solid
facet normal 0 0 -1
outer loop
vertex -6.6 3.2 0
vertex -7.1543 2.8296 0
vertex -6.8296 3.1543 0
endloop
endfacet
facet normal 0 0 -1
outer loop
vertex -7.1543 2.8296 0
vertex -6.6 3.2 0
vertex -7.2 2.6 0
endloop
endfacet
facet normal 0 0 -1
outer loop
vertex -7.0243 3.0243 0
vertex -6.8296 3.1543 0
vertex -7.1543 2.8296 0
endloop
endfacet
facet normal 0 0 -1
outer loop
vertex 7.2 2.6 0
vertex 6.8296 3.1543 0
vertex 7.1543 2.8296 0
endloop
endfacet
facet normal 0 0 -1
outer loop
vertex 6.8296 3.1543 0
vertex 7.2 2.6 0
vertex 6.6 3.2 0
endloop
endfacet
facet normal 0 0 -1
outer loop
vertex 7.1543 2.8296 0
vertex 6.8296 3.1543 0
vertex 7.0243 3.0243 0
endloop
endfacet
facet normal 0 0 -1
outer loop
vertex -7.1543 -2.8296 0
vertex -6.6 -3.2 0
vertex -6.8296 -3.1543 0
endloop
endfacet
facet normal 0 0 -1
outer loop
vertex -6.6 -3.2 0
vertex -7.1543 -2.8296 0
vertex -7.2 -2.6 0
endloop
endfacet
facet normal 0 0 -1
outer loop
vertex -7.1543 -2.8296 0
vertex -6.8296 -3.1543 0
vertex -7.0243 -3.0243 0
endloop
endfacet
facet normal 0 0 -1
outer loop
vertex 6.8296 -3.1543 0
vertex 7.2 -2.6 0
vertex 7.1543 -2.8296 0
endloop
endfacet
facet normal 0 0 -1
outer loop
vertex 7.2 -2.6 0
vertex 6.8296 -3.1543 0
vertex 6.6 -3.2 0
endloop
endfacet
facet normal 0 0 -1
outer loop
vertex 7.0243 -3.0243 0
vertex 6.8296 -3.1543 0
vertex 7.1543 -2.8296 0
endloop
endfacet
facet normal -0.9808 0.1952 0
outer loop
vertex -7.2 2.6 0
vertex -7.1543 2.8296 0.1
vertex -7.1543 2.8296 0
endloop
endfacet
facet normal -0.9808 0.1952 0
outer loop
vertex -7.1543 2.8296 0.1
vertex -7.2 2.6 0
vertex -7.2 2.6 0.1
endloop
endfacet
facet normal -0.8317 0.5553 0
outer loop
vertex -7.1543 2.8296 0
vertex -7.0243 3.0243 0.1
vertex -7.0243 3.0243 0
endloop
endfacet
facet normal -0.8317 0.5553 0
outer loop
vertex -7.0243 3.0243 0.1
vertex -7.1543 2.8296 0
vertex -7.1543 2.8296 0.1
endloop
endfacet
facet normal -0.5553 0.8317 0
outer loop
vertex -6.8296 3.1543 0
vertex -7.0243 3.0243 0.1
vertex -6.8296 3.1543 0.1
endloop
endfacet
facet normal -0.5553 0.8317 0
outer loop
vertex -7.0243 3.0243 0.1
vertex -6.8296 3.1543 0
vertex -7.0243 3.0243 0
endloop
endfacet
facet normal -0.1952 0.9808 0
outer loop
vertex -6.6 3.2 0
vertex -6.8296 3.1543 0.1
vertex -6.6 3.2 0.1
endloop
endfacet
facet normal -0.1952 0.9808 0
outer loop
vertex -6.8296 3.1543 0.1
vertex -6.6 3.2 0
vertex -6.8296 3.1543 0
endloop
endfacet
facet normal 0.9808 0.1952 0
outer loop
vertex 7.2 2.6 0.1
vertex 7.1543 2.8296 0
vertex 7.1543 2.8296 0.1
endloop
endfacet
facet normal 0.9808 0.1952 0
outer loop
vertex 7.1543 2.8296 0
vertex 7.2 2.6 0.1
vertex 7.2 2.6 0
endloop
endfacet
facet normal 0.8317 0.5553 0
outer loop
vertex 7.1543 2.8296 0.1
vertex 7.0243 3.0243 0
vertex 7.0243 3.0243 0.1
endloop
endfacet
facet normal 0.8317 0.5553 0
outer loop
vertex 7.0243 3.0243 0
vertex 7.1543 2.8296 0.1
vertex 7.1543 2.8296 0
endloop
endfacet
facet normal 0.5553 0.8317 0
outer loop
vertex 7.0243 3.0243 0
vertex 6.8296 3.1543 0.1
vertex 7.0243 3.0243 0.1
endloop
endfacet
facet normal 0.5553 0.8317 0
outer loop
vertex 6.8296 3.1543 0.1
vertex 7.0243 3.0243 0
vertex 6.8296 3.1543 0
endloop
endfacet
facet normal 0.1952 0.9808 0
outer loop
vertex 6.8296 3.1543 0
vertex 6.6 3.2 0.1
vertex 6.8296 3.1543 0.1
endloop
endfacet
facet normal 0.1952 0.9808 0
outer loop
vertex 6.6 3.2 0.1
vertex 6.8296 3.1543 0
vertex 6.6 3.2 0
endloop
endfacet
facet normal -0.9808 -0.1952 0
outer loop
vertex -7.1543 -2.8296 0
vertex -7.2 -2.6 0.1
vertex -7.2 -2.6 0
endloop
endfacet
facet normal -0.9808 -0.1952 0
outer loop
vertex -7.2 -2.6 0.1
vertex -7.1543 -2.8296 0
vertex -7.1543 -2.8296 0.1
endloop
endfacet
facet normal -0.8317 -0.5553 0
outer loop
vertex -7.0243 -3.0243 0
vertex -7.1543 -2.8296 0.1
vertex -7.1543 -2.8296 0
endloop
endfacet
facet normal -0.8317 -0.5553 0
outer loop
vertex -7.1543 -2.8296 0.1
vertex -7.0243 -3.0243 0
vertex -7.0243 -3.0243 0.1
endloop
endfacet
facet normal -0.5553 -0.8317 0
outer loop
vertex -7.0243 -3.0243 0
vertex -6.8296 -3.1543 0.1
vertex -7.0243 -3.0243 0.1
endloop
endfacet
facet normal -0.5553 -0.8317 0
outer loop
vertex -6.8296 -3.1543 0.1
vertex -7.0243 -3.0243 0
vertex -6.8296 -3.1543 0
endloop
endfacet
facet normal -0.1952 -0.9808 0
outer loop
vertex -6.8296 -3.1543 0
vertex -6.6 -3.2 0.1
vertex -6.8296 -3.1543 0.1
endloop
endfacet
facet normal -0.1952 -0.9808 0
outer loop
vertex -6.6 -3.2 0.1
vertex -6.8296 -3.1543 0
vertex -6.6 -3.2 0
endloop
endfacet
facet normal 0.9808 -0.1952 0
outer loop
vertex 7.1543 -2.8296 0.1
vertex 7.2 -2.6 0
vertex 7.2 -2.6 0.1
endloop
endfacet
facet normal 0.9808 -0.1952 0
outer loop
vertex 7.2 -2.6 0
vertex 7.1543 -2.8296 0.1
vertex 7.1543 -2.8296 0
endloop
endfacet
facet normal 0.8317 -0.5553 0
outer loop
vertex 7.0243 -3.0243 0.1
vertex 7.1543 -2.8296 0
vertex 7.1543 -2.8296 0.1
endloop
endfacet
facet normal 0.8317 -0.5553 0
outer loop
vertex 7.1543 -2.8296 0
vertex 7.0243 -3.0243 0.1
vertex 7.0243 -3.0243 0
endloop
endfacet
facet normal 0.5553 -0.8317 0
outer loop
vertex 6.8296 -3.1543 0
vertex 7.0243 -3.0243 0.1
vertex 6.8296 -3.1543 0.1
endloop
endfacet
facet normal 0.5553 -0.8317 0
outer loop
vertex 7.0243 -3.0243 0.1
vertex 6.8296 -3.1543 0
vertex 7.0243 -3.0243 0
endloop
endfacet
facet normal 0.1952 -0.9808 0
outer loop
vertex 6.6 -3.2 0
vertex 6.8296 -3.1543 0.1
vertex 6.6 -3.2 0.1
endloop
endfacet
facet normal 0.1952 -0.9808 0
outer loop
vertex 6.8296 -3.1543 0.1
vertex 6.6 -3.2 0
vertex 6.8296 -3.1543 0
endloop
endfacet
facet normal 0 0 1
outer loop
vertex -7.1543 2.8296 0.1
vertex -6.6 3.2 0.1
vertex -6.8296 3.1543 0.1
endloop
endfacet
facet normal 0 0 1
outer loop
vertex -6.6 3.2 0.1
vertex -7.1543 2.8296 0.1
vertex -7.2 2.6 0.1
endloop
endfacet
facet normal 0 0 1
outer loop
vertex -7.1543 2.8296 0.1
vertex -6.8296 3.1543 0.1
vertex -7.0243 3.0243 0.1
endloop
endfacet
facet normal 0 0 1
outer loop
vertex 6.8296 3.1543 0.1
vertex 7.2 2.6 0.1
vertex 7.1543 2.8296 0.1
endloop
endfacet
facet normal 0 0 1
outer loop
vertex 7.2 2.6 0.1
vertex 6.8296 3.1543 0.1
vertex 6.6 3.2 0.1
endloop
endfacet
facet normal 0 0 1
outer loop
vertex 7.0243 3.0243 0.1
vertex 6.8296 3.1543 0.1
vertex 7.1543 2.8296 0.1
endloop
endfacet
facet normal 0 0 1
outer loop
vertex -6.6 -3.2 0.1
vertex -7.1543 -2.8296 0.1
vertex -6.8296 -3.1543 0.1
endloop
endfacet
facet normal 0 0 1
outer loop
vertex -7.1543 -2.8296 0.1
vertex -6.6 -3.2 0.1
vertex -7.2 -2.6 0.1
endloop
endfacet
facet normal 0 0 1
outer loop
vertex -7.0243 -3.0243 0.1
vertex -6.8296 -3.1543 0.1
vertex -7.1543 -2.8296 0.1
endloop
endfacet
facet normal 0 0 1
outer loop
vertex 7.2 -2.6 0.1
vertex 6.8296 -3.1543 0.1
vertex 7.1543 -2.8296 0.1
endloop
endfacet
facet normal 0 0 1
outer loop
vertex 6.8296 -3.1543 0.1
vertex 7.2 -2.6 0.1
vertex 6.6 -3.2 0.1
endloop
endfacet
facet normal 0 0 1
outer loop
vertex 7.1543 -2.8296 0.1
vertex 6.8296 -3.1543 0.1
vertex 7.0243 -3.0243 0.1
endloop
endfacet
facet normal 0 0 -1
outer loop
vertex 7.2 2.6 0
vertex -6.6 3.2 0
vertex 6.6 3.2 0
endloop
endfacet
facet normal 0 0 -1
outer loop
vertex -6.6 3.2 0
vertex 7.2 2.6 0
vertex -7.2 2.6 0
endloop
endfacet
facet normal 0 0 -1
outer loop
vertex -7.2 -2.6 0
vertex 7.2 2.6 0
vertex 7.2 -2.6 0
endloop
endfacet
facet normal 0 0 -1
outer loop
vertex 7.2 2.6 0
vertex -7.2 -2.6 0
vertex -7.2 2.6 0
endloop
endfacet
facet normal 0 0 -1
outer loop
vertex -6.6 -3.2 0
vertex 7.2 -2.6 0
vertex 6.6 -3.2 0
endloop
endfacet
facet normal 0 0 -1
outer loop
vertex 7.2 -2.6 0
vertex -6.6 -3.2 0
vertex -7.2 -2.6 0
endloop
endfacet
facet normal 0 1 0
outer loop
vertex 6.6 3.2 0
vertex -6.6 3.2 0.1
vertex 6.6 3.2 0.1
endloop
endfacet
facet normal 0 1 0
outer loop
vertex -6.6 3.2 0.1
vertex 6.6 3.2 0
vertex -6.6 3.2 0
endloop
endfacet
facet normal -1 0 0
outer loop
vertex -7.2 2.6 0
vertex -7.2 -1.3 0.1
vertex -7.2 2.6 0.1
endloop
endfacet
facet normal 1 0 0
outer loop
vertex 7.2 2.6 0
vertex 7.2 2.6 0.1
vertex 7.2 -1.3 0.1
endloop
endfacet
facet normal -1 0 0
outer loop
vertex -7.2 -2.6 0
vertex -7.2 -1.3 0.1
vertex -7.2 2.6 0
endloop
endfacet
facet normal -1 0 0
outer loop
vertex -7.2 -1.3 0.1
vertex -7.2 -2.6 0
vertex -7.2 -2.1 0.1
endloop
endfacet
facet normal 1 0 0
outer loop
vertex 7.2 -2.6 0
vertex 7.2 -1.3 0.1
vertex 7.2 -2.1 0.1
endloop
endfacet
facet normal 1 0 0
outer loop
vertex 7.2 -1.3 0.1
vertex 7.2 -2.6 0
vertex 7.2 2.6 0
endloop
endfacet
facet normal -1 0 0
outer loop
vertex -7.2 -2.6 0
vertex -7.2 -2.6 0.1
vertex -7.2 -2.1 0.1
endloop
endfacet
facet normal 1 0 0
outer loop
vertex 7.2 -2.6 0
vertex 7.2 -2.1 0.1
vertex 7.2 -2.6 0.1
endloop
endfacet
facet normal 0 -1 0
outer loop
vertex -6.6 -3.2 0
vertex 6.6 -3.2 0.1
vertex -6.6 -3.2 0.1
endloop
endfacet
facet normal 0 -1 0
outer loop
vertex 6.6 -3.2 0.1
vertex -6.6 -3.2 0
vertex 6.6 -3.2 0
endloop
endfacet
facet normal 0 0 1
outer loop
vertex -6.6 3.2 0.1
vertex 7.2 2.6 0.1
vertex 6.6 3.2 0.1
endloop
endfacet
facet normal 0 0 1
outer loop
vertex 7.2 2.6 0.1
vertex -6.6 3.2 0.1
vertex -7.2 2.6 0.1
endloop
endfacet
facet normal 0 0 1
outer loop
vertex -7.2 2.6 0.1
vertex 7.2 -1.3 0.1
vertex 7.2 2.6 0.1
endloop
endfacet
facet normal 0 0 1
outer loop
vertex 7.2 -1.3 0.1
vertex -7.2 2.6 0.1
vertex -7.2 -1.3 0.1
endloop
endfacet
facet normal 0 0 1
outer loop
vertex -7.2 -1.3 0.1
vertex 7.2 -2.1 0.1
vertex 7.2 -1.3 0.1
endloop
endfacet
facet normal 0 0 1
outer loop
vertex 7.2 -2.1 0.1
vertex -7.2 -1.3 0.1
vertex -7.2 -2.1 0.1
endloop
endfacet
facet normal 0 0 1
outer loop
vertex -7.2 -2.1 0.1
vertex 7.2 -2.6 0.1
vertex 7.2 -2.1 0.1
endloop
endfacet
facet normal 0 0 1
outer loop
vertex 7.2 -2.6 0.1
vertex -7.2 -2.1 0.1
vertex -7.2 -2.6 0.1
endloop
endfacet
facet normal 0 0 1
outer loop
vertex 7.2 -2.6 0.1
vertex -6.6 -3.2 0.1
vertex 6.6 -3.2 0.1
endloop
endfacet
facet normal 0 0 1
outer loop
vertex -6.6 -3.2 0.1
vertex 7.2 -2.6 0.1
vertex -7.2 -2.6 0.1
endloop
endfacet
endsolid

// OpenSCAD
// file: ../p/1-4cyli.scad
use <../lib.scad>
function ldraw_lib__1_4cyli() = [
// 0 Cylinder 0.25
// 0 Name: 1-4cyli.dat
// 0 Author: James Jessiman
// 0 !LDRAW_ORG Primitive UPDATE 2012-01
// 0 !LICENSE Licensed under CC BY 2.0 and CC BY 4.0 : see CAreadme.txt
// 
// 0 BFC CERTIFY CCW
  [0,"BFC","CERTIFY"],
  [0,"BFC","CCW"],
// 
// 0 !HISTORY 2002-03-23 [sbliss] Added BFC statement.
// 0 !HISTORY 2002-04-25 [PTadmin] Official Update 2002-02
// 0 !HISTORY 2007-06-22 [PTadmin] Header formatted for Contributor Agreement
// 0 !HISTORY 2008-07-01 [PTadmin] Official Update 2008-01
// 0 !HISTORY 2012-02-16 [Philo] Changed to CCW
// 0 !HISTORY 2012-03-30 [PTadmin] Official Update 2012-01
// 
// 
// 4 16 1 1 0 0.9239 1 0.3827 0.9239 0 0.3827 1 0 0
  [4,16,1,1,0,0.9239,1,0.3827,0.9239,0,0.3827,1,0,0],
// 5 24 1 0 0 1 1 0 0.9239 0 0.3827 1 0 -1
  [5,24,1,0,0,1,1,0,0.9239,0,0.3827,1,0,-1],
// 4 16 0.9239 1 0.3827 0.7071 1 0.7071 0.7071 0 0.7071 0.9239 0 0.3827
  [4,16,0.9239,1,0.3827,0.7071,1,0.7071,0.7071,0,0.7071,0.9239,0,0.3827],
// 5 24 0.9239 0 0.3827 0.9239 1 0.3827 0.7071 0 0.7071 1 0 0
  [5,24,0.9239,0,0.3827,0.9239,1,0.3827,0.7071,0,0.7071,1,0,0],
// 4 16 0.7071 1 0.7071 0.3827 1 0.9239 0.3827 0 0.9239 0.7071 0 0.7071
  [4,16,0.7071,1,0.7071,0.3827,1,0.9239,0.3827,0,0.9239,0.7071,0,0.7071],
// 5 24 0.7071 0 0.7071 0.7071 1 0.7071 0.3827 0 0.9239 0.9239 0 0.3827
  [5,24,0.7071,0,0.7071,0.7071,1,0.7071,0.3827,0,0.9239,0.9239,0,0.3827],
// 4 16 0.3827 1 0.9239 0 1 1 0 0 1 0.3827 0 0.9239
  [4,16,0.3827,1,0.9239,0,1,1,0,0,1,0.3827,0,0.9239],
// 5 24 0.3827 0 0.9239 0.3827 1 0.9239 0 0 1 0.7071 0 0.7071
  [5,24,0.3827,0,0.9239,0.3827,1,0.9239,0,0,1,0.7071,0,0.7071],
// 5 24 0 0 1 0 1 1 0.3827 0 0.9239 -1 0 1
  [5,24,0,0,1,0,1,1,0.3827,0,0.9239,-1,0,1],
];
makepoly(ldraw_lib__1_4cyli(), line=0.2);
// file: ../p/1-4chrd.scad
use <../lib.scad>
function ldraw_lib__1_4chrd() = [
// 0 Chord 0.25
// 0 Name: 1-4chrd.dat
// 0 Author: Tony Hafner [hafhead]
// 0 !LDRAW_ORG Primitive UPDATE 2012-02
// 0 !LICENSE Licensed under CC BY 2.0 and CC BY 4.0 : see CAreadme.txt
// 
// 0 BFC CERTIFY CCW
  [0,"BFC","CERTIFY"],
  [0,"BFC","CCW"],
// 
// 0 !HISTORY 2004-04-22 [PTadmin] Official Update 2004-02
// 0 !HISTORY 2007-10-09 [PTadmin] Header formatted for Contributor Agreement
// 0 !HISTORY 2008-07-01 [PTadmin] Official Update 2008-01
// 0 !HISTORY 2012-08-02 [MMR1988] Re-creation with PrimGen2 and Rectifier
// 0 !HISTORY 2012-08-09 [PTadmin] Official Update 2012-02
// 
// 
// 4 16 0.9239 0 0.3827 0.3827 0 0.9239 0 0 1 1 0 0
  [4,16,0.9239,0,0.3827,0.3827,0,0.9239,0,0,1,1,0,0],
// 3 16 0.7071 0 0.7071 0.3827 0 0.9239 0.9239 0 0.3827
  [3,16,0.7071,0,0.7071,0.3827,0,0.9239,0.9239,0,0.3827],
];
makepoly(ldraw_lib__1_4chrd(), line=0.2);
// main file
use <../lib.scad>
use <../p/1-4chrd.scad>
use <../p/1-4cyli.scad>
function ldraw_lib__6142622f() = [
// 0 Sticker  0.8 x  1.8 with Red Stripe on Black Background
// 0 Name: 6142622f.dat
// 0 Author: Massimo Maso [Sirio]
// 0 !LDRAW_ORG Part UPDATE 2022-02
// 0 !LICENSE Licensed under CC BY 2.0 and CC BY 4.0 : see CAreadme.txt
// 
// 0 BFC CERTIFY CCW
  [0,"BFC","CERTIFY"],
  [0,"BFC","CCW"],
// 
// 0 !KEYWORDS Chevrolet, Corvette, Set 75870, Speed Champions
// 
// 0 !HISTORY 2022-03-06 [PTadmin] Official Update 2022-02
// 
// 
// 0 // Primitives
// 
// 1 16 -16.5 0 6.5 -1.5 0 0 0 -1 0 0 0 1.5 1-4chrd.dat
  [1,16,-16.5,0,6.5,-1.5,0,0,0,-1,0,0,0,1.5, ldraw_lib__1_4chrd()],
// 1 16 16.5 0 6.5 1.5 0 0 0 -1 0 0 0 1.5 1-4chrd.dat
  [1,16,16.5,0,6.5,1.5,0,0,0,-1,0,0,0,1.5, ldraw_lib__1_4chrd()],
// 1 16 -16.5 0 -6.5 -1.5 0 0 0 -1 0 0 0 -1.5 1-4chrd.dat
  [1,16,-16.5,0,-6.5,-1.5,0,0,0,-1,0,0,0,-1.5, ldraw_lib__1_4chrd()],
// 1 16 16.5 0 -6.5 1.5 0 0 0 -1 0 0 0 -1.5 1-4chrd.dat
  [1,16,16.5,0,-6.5,1.5,0,0,0,-1,0,0,0,-1.5, ldraw_lib__1_4chrd()],
// 1 16 -16.5 0 6.5 -1.5 0 0 0 -.25 0 0 0 1.5 1-4cyli.dat
  [1,16,-16.5,0,6.5,-1.5,0,0,0,-.25,0,0,0,1.5, ldraw_lib__1_4cyli()],
// 1 16 16.5 0 6.5 1.5 0 0 0 -.25 0 0 0 1.5 1-4cyli.dat
  [1,16,16.5,0,6.5,1.5,0,0,0,-.25,0,0,0,1.5, ldraw_lib__1_4cyli()],
// 1 16 -16.5 0 -6.5 -1.5 0 0 0 -.25 0 0 0 -1.5 1-4cyli.dat
  [1,16,-16.5,0,-6.5,-1.5,0,0,0,-.25,0,0,0,-1.5, ldraw_lib__1_4cyli()],
// 1 16 16.5 0 -6.5 1.5 0 0 0 -.25 0 0 0 -1.5 1-4cyli.dat
  [1,16,16.5,0,-6.5,1.5,0,0,0,-.25,0,0,0,-1.5, ldraw_lib__1_4cyli()],
// 1 0 -16.5 -.25 6.5 -1.5 0 0 0 1 0 0 0 1.5 1-4chrd.dat
  [1,0,-16.5,-.25,6.5,-1.5,0,0,0,1,0,0,0,1.5, ldraw_lib__1_4chrd()],
// 1 0 16.5 -.25 6.5 1.5 0 0 0 1 0 0 0 1.5 1-4chrd.dat
  [1,0,16.5,-.25,6.5,1.5,0,0,0,1,0,0,0,1.5, ldraw_lib__1_4chrd()],
// 1 0 -16.5 -.25 -6.5 -1.5 0 0 0 1 0 0 0 -1.5 1-4chrd.dat
  [1,0,-16.5,-.25,-6.5,-1.5,0,0,0,1,0,0,0,-1.5, ldraw_lib__1_4chrd()],
// 1 0 16.5 -.25 -6.5 1.5 0 0 0 1 0 0 0 -1.5 1-4chrd.dat
  [1,0,16.5,-.25,-6.5,1.5,0,0,0,1,0,0,0,-1.5, ldraw_lib__1_4chrd()],
// 0 // Bottom face
// 4 16 16.5 0 8 18 0 6.5 -18 0 6.5 -16.5 0 8
  [4,16,16.5,0,8,18,0,6.5,-18,0,6.5,-16.5,0,8],
// 4 16 18 0 6.5 18 0 -6.5 -18 0 -6.5 -18 0 6.5
  [4,16,18,0,6.5,18,0,-6.5,-18,0,-6.5,-18,0,6.5],
// 4 16 -18 0 -6.5 18 0 -6.5 16.5 0 -8 -16.5 0 -8
  [4,16,-18,0,-6.5,18,0,-6.5,16.5,0,-8,-16.5,0,-8],
// 0 // Lateral faces
// 4 16 -16.5 0 8 -16.5 -0.25 8 16.5 -0.25 8 16.5 0 8
  [4,16,-16.5,0,8,-16.5,-0.25,8,16.5,-0.25,8,16.5,0,8],
// 3 16 -18 0 6.5 -18 -.25 -3.25 -18 -.25 6.5
  [3,16,-18,0,6.5,-18,-.25,-3.25,-18,-.25,6.5],
// 3 16 18 0 6.5 18 -.25 6.5 18 -.25 -3.25
  [3,16,18,0,6.5,18,-.25,6.5,18,-.25,-3.25],
// 4 16 -18 0 6.5 -18 0 -6.5 -18 -.25 -5.25 -18 -.25 -3.25
  [4,16,-18,0,6.5,-18,0,-6.5,-18,-.25,-5.25,-18,-.25,-3.25],
// 4 16 18 0 6.5 18 -.25 -3.25 18 -.25 -5.25 18 0 -6.5
  [4,16,18,0,6.5,18,-.25,-3.25,18,-.25,-5.25,18,0,-6.5],
// 3 16 -18 0 -6.5 -18 -.25 -6.5 -18 -.25 -5.25
  [3,16,-18,0,-6.5,-18,-.25,-6.5,-18,-.25,-5.25],
// 3 16 18 0 -6.5 18 -.25 -5.25 18 -.25 -6.5
  [3,16,18,0,-6.5,18,-.25,-5.25,18,-.25,-6.5],
// 4 16 16.5 0 -8 16.5 -0.25 -8 -16.5 -0.25 -8 -16.5 0 -8
  [4,16,16.5,0,-8,16.5,-0.25,-8,-16.5,-0.25,-8,-16.5,0,-8],
// 0 // Top face
// 4 0 -16.5 -.25 8 -18 -.25 6.5 18 -.25 6.5 16.5 -.25 8
  [4,0,-16.5,-.25,8,-18,-.25,6.5,18,-.25,6.5,16.5,-.25,8],
// 4 0 -18 -.25 6.5 -18 -.25 -3.25 18 -.25 -3.25 18 -.25 6.5
  [4,0,-18,-.25,6.5,-18,-.25,-3.25,18,-.25,-3.25,18,-.25,6.5],
// 4 4 -18 -.25 -3.25 -18 -.25 -5.25 18 -.25 -5.25 18 -.25 -3.25
  [4,4,-18,-.25,-3.25,-18,-.25,-5.25,18,-.25,-5.25,18,-.25,-3.25],
// 4 0 18 -.25 -6.5 18 -.25 -5.25 -18 -.25 -5.25 -18 -.25 -6.5
  [4,0,18,-.25,-6.5,18,-.25,-5.25,-18,-.25,-5.25,-18,-.25,-6.5],
// 4 0 16.5 -.25 -8 18 -.25 -6.5 -18 -.25 -6.5 -16.5 -.25 -8
  [4,0,16.5,-.25,-8,18,-.25,-6.5,-18,-.25,-6.5,-16.5,-.25,-8],
];
makepoly(ldraw_lib__6142622f(), line=0.2);
